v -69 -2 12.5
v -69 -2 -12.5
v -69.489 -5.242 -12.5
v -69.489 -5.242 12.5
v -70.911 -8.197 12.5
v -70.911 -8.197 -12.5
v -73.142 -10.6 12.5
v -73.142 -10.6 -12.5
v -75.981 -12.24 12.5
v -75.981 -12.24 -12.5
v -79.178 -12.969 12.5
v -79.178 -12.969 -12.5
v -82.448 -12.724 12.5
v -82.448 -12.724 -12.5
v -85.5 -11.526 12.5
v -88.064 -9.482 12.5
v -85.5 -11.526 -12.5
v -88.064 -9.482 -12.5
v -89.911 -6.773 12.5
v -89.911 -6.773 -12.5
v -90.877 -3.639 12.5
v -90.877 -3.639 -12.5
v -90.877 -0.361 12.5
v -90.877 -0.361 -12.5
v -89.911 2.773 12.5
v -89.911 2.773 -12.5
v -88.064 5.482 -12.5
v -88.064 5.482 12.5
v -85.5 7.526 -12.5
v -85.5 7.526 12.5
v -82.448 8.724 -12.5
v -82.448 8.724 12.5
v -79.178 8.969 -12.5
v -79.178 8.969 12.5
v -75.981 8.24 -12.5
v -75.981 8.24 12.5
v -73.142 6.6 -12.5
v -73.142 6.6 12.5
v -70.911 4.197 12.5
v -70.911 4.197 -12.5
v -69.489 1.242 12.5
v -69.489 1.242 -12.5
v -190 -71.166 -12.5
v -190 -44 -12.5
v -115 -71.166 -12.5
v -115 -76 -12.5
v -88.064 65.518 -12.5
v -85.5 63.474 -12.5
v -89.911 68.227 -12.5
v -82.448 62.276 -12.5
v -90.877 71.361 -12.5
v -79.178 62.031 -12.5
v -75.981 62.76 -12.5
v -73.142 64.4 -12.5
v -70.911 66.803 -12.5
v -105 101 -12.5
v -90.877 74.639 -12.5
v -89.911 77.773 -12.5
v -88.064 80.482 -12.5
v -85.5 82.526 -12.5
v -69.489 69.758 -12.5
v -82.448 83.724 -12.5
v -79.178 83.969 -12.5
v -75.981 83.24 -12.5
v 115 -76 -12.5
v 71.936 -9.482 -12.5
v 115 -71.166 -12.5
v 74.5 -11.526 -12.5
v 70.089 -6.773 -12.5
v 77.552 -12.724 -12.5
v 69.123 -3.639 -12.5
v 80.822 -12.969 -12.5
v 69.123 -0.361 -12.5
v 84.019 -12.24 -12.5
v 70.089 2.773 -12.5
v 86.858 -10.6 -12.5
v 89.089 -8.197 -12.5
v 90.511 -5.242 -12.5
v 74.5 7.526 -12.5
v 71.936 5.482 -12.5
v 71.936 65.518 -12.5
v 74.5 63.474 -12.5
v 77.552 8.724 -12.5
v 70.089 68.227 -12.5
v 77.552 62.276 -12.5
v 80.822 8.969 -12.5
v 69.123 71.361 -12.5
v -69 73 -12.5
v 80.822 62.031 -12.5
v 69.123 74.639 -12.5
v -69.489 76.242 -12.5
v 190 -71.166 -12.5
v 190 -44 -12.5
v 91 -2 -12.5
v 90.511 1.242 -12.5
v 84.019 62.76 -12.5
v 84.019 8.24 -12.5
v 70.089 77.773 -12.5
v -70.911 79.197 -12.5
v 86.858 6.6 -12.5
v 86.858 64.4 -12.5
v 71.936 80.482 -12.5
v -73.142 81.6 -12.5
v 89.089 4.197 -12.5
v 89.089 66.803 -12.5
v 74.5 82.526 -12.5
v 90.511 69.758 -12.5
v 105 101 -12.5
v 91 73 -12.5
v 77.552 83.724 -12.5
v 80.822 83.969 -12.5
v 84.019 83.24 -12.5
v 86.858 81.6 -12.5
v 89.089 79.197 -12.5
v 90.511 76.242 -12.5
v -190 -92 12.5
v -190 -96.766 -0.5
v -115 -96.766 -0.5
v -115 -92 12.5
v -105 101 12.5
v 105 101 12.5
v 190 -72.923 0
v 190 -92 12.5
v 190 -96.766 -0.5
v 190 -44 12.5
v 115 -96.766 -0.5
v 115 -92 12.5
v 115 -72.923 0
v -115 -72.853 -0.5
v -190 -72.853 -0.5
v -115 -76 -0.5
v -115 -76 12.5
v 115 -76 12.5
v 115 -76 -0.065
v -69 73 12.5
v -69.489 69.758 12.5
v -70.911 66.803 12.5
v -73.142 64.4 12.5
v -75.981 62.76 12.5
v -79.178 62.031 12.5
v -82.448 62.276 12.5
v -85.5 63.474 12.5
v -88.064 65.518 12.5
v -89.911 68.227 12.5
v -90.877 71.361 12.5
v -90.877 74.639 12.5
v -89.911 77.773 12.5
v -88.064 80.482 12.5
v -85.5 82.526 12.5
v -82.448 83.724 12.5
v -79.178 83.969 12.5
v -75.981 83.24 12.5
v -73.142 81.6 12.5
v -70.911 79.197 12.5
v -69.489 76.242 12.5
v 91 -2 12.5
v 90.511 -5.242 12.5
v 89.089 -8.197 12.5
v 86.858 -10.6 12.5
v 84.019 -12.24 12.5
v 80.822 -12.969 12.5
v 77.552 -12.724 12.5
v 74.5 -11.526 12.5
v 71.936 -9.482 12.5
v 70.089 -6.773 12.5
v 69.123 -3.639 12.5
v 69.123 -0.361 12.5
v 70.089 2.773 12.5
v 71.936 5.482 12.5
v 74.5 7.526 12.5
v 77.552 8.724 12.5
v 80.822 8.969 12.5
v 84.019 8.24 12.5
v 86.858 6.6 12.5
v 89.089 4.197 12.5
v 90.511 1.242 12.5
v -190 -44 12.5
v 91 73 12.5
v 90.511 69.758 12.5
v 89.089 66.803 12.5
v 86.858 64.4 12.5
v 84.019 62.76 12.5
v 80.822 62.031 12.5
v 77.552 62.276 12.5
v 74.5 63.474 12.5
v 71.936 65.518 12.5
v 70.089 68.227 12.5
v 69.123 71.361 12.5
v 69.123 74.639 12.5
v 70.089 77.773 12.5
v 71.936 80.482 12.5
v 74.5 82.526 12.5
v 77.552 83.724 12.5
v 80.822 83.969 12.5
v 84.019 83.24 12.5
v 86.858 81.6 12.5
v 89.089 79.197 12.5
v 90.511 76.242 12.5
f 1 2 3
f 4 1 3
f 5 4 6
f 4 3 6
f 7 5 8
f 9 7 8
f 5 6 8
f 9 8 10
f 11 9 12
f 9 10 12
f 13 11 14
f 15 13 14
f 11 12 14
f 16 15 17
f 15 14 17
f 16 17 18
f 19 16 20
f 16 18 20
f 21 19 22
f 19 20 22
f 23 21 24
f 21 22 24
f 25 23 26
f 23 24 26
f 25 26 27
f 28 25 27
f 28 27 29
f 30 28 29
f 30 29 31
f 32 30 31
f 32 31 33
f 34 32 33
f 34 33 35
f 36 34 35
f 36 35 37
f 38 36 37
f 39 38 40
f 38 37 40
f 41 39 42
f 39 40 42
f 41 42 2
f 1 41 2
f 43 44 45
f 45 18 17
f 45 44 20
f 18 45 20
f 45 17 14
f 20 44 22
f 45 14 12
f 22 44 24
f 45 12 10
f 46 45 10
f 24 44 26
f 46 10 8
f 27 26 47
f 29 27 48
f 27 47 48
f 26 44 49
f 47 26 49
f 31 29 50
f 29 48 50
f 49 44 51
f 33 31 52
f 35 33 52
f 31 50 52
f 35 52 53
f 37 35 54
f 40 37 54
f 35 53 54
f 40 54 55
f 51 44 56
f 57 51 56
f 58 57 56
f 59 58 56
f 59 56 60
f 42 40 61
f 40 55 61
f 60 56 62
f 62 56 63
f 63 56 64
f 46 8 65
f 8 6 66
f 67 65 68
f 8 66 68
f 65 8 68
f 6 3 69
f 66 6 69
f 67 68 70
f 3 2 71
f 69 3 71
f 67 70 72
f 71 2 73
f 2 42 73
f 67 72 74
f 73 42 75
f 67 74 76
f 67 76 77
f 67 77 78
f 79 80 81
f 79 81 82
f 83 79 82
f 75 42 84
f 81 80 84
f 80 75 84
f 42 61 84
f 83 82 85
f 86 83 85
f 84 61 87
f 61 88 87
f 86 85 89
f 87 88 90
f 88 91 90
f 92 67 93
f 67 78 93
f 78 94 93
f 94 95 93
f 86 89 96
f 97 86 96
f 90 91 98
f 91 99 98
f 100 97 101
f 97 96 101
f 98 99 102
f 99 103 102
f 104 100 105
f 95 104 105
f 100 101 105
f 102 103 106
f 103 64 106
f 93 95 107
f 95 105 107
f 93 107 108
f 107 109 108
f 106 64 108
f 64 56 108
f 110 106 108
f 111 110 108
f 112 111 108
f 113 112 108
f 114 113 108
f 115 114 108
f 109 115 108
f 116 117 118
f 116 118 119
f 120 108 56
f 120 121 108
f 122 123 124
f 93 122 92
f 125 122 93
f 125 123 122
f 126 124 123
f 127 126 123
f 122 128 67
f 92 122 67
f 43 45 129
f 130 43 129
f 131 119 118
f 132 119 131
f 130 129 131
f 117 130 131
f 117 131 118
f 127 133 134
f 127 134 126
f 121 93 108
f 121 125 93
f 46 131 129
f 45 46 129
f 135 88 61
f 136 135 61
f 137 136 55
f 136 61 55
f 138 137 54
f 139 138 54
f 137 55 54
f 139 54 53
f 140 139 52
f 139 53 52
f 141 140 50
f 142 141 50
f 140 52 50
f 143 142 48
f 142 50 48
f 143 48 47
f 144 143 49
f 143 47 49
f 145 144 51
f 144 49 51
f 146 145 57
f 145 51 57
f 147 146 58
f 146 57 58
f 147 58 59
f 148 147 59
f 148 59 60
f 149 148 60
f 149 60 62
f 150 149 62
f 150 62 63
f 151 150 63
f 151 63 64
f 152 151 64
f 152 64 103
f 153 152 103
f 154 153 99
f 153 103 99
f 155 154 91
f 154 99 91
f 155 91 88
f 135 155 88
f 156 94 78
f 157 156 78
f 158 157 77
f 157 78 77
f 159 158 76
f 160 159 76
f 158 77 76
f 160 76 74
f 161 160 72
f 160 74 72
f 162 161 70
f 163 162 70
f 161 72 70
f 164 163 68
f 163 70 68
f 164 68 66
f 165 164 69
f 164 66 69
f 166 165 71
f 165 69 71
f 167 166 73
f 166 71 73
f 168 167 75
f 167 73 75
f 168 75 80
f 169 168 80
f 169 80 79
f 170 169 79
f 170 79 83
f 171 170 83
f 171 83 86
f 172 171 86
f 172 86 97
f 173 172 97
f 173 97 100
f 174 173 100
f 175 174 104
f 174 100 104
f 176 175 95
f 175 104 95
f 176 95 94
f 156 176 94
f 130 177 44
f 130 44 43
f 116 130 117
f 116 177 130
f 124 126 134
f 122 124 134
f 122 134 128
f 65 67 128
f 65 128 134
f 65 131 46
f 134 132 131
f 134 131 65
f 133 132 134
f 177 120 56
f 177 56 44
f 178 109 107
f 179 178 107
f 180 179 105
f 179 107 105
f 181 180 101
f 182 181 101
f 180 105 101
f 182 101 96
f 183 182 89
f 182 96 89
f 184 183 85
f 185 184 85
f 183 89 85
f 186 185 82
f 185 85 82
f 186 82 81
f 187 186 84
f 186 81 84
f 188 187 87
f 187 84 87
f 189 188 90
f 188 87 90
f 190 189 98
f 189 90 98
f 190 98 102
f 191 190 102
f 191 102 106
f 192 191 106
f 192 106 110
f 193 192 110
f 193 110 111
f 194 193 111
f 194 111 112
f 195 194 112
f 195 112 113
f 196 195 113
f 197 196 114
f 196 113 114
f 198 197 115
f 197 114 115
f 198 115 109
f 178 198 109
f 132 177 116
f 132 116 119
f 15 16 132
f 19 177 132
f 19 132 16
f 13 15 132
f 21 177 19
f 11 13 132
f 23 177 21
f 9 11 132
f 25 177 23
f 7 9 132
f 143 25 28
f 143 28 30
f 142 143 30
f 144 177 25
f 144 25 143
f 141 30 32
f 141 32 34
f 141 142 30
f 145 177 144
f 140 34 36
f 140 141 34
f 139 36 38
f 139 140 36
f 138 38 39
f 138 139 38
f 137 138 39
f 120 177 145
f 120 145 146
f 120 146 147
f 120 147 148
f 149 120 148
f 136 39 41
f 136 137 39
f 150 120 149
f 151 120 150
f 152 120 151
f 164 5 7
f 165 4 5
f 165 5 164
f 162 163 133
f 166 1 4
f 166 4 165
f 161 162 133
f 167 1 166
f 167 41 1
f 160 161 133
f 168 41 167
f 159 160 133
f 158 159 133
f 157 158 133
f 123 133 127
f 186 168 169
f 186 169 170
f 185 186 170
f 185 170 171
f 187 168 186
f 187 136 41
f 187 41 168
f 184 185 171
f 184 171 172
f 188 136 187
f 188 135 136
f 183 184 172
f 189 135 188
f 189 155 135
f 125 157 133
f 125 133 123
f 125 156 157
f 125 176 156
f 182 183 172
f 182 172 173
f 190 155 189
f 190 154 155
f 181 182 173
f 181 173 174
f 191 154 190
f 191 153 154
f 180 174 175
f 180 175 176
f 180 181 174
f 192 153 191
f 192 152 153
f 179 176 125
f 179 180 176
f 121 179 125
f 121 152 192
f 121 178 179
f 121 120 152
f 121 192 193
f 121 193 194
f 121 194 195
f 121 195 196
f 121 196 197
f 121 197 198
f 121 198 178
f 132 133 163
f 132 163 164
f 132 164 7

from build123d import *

# Parameters (mm, degrees)
F1_DEPTH      = 12.5
F1_DEPTH_BACK = 12.5
F3_DEPTH      = 190
F3_DEPTH_BACK = 190
F5_DEPTH      = 75
F7_DEPTH      = 75
F8_R          = 11
F9_DEPTH      = 25


with BuildPart() as f1:
    # F0 (on Top) → F1 (new body, two sides)
    with BuildSketch(Plane.XY) as f1_sk:
        Polygon((105, 101), (-105, 101), (-190, -44), (-190, -101), (-115, -101), (-115, -76), (115, -76), (115, -101), (190, -101), (190, -44), align=None)
    extrude(amount=F1_DEPTH)
    extrude(f1_sk.sketch, amount=-F1_DEPTH_BACK)

    # F2 (on Right) → F3 (cut, two sides)
    with BuildSketch(Plane.YZ) as f3_sk:
        Polygon((-92, 12.5), (-101, 12.5), (-101.165957, -12.499449), align=None)
    extrude(amount=F3_DEPTH, mode=Mode.SUBTRACT)
    extrude(f3_sk.sketch, amount=-F3_DEPTH_BACK, mode=Mode.SUBTRACT)

    # F4 (on face) → F5 (cut, through all)
    with BuildSketch(Plane.YZ.offset(-115)):
        Polygon((-72.852649, -0.5), (-96.766403, -0.5), (-101.166159, -12.5), (-71.166159, -12.5), align=None)
    extrude(amount=-F5_DEPTH, mode=Mode.SUBTRACT)

    # F6 (on face) → F7 (cut, through all)
    with BuildSketch(Plane(origin=(115, 0, 0), x_dir=(0, -1, 0), z_dir=(-1, 0, 0))):
        Polygon((101.166159, -12.5), (96.766403, -0.5), (72.92292, 0), (71.166159, -12.5), align=None)
    extrude(amount=-F7_DEPTH, mode=Mode.SUBTRACT)

    # F8 (on face) → F9 (cut)
    with BuildSketch(Plane(origin=(0, 0, -12.5), x_dir=(1, 0, 0), z_dir=(0, 0, -1))):
        with Locations((-80, -73)):
            Circle(F8_R)
        with Locations((-80, 2)):
            Circle(F8_R)
        with Locations((80, -73)):
            Circle(F8_R)
        with Locations((80, 2)):
            Circle(F8_R)
    extrude(amount=-F9_DEPTH, mode=Mode.SUBTRACT)


solid = f1.part
